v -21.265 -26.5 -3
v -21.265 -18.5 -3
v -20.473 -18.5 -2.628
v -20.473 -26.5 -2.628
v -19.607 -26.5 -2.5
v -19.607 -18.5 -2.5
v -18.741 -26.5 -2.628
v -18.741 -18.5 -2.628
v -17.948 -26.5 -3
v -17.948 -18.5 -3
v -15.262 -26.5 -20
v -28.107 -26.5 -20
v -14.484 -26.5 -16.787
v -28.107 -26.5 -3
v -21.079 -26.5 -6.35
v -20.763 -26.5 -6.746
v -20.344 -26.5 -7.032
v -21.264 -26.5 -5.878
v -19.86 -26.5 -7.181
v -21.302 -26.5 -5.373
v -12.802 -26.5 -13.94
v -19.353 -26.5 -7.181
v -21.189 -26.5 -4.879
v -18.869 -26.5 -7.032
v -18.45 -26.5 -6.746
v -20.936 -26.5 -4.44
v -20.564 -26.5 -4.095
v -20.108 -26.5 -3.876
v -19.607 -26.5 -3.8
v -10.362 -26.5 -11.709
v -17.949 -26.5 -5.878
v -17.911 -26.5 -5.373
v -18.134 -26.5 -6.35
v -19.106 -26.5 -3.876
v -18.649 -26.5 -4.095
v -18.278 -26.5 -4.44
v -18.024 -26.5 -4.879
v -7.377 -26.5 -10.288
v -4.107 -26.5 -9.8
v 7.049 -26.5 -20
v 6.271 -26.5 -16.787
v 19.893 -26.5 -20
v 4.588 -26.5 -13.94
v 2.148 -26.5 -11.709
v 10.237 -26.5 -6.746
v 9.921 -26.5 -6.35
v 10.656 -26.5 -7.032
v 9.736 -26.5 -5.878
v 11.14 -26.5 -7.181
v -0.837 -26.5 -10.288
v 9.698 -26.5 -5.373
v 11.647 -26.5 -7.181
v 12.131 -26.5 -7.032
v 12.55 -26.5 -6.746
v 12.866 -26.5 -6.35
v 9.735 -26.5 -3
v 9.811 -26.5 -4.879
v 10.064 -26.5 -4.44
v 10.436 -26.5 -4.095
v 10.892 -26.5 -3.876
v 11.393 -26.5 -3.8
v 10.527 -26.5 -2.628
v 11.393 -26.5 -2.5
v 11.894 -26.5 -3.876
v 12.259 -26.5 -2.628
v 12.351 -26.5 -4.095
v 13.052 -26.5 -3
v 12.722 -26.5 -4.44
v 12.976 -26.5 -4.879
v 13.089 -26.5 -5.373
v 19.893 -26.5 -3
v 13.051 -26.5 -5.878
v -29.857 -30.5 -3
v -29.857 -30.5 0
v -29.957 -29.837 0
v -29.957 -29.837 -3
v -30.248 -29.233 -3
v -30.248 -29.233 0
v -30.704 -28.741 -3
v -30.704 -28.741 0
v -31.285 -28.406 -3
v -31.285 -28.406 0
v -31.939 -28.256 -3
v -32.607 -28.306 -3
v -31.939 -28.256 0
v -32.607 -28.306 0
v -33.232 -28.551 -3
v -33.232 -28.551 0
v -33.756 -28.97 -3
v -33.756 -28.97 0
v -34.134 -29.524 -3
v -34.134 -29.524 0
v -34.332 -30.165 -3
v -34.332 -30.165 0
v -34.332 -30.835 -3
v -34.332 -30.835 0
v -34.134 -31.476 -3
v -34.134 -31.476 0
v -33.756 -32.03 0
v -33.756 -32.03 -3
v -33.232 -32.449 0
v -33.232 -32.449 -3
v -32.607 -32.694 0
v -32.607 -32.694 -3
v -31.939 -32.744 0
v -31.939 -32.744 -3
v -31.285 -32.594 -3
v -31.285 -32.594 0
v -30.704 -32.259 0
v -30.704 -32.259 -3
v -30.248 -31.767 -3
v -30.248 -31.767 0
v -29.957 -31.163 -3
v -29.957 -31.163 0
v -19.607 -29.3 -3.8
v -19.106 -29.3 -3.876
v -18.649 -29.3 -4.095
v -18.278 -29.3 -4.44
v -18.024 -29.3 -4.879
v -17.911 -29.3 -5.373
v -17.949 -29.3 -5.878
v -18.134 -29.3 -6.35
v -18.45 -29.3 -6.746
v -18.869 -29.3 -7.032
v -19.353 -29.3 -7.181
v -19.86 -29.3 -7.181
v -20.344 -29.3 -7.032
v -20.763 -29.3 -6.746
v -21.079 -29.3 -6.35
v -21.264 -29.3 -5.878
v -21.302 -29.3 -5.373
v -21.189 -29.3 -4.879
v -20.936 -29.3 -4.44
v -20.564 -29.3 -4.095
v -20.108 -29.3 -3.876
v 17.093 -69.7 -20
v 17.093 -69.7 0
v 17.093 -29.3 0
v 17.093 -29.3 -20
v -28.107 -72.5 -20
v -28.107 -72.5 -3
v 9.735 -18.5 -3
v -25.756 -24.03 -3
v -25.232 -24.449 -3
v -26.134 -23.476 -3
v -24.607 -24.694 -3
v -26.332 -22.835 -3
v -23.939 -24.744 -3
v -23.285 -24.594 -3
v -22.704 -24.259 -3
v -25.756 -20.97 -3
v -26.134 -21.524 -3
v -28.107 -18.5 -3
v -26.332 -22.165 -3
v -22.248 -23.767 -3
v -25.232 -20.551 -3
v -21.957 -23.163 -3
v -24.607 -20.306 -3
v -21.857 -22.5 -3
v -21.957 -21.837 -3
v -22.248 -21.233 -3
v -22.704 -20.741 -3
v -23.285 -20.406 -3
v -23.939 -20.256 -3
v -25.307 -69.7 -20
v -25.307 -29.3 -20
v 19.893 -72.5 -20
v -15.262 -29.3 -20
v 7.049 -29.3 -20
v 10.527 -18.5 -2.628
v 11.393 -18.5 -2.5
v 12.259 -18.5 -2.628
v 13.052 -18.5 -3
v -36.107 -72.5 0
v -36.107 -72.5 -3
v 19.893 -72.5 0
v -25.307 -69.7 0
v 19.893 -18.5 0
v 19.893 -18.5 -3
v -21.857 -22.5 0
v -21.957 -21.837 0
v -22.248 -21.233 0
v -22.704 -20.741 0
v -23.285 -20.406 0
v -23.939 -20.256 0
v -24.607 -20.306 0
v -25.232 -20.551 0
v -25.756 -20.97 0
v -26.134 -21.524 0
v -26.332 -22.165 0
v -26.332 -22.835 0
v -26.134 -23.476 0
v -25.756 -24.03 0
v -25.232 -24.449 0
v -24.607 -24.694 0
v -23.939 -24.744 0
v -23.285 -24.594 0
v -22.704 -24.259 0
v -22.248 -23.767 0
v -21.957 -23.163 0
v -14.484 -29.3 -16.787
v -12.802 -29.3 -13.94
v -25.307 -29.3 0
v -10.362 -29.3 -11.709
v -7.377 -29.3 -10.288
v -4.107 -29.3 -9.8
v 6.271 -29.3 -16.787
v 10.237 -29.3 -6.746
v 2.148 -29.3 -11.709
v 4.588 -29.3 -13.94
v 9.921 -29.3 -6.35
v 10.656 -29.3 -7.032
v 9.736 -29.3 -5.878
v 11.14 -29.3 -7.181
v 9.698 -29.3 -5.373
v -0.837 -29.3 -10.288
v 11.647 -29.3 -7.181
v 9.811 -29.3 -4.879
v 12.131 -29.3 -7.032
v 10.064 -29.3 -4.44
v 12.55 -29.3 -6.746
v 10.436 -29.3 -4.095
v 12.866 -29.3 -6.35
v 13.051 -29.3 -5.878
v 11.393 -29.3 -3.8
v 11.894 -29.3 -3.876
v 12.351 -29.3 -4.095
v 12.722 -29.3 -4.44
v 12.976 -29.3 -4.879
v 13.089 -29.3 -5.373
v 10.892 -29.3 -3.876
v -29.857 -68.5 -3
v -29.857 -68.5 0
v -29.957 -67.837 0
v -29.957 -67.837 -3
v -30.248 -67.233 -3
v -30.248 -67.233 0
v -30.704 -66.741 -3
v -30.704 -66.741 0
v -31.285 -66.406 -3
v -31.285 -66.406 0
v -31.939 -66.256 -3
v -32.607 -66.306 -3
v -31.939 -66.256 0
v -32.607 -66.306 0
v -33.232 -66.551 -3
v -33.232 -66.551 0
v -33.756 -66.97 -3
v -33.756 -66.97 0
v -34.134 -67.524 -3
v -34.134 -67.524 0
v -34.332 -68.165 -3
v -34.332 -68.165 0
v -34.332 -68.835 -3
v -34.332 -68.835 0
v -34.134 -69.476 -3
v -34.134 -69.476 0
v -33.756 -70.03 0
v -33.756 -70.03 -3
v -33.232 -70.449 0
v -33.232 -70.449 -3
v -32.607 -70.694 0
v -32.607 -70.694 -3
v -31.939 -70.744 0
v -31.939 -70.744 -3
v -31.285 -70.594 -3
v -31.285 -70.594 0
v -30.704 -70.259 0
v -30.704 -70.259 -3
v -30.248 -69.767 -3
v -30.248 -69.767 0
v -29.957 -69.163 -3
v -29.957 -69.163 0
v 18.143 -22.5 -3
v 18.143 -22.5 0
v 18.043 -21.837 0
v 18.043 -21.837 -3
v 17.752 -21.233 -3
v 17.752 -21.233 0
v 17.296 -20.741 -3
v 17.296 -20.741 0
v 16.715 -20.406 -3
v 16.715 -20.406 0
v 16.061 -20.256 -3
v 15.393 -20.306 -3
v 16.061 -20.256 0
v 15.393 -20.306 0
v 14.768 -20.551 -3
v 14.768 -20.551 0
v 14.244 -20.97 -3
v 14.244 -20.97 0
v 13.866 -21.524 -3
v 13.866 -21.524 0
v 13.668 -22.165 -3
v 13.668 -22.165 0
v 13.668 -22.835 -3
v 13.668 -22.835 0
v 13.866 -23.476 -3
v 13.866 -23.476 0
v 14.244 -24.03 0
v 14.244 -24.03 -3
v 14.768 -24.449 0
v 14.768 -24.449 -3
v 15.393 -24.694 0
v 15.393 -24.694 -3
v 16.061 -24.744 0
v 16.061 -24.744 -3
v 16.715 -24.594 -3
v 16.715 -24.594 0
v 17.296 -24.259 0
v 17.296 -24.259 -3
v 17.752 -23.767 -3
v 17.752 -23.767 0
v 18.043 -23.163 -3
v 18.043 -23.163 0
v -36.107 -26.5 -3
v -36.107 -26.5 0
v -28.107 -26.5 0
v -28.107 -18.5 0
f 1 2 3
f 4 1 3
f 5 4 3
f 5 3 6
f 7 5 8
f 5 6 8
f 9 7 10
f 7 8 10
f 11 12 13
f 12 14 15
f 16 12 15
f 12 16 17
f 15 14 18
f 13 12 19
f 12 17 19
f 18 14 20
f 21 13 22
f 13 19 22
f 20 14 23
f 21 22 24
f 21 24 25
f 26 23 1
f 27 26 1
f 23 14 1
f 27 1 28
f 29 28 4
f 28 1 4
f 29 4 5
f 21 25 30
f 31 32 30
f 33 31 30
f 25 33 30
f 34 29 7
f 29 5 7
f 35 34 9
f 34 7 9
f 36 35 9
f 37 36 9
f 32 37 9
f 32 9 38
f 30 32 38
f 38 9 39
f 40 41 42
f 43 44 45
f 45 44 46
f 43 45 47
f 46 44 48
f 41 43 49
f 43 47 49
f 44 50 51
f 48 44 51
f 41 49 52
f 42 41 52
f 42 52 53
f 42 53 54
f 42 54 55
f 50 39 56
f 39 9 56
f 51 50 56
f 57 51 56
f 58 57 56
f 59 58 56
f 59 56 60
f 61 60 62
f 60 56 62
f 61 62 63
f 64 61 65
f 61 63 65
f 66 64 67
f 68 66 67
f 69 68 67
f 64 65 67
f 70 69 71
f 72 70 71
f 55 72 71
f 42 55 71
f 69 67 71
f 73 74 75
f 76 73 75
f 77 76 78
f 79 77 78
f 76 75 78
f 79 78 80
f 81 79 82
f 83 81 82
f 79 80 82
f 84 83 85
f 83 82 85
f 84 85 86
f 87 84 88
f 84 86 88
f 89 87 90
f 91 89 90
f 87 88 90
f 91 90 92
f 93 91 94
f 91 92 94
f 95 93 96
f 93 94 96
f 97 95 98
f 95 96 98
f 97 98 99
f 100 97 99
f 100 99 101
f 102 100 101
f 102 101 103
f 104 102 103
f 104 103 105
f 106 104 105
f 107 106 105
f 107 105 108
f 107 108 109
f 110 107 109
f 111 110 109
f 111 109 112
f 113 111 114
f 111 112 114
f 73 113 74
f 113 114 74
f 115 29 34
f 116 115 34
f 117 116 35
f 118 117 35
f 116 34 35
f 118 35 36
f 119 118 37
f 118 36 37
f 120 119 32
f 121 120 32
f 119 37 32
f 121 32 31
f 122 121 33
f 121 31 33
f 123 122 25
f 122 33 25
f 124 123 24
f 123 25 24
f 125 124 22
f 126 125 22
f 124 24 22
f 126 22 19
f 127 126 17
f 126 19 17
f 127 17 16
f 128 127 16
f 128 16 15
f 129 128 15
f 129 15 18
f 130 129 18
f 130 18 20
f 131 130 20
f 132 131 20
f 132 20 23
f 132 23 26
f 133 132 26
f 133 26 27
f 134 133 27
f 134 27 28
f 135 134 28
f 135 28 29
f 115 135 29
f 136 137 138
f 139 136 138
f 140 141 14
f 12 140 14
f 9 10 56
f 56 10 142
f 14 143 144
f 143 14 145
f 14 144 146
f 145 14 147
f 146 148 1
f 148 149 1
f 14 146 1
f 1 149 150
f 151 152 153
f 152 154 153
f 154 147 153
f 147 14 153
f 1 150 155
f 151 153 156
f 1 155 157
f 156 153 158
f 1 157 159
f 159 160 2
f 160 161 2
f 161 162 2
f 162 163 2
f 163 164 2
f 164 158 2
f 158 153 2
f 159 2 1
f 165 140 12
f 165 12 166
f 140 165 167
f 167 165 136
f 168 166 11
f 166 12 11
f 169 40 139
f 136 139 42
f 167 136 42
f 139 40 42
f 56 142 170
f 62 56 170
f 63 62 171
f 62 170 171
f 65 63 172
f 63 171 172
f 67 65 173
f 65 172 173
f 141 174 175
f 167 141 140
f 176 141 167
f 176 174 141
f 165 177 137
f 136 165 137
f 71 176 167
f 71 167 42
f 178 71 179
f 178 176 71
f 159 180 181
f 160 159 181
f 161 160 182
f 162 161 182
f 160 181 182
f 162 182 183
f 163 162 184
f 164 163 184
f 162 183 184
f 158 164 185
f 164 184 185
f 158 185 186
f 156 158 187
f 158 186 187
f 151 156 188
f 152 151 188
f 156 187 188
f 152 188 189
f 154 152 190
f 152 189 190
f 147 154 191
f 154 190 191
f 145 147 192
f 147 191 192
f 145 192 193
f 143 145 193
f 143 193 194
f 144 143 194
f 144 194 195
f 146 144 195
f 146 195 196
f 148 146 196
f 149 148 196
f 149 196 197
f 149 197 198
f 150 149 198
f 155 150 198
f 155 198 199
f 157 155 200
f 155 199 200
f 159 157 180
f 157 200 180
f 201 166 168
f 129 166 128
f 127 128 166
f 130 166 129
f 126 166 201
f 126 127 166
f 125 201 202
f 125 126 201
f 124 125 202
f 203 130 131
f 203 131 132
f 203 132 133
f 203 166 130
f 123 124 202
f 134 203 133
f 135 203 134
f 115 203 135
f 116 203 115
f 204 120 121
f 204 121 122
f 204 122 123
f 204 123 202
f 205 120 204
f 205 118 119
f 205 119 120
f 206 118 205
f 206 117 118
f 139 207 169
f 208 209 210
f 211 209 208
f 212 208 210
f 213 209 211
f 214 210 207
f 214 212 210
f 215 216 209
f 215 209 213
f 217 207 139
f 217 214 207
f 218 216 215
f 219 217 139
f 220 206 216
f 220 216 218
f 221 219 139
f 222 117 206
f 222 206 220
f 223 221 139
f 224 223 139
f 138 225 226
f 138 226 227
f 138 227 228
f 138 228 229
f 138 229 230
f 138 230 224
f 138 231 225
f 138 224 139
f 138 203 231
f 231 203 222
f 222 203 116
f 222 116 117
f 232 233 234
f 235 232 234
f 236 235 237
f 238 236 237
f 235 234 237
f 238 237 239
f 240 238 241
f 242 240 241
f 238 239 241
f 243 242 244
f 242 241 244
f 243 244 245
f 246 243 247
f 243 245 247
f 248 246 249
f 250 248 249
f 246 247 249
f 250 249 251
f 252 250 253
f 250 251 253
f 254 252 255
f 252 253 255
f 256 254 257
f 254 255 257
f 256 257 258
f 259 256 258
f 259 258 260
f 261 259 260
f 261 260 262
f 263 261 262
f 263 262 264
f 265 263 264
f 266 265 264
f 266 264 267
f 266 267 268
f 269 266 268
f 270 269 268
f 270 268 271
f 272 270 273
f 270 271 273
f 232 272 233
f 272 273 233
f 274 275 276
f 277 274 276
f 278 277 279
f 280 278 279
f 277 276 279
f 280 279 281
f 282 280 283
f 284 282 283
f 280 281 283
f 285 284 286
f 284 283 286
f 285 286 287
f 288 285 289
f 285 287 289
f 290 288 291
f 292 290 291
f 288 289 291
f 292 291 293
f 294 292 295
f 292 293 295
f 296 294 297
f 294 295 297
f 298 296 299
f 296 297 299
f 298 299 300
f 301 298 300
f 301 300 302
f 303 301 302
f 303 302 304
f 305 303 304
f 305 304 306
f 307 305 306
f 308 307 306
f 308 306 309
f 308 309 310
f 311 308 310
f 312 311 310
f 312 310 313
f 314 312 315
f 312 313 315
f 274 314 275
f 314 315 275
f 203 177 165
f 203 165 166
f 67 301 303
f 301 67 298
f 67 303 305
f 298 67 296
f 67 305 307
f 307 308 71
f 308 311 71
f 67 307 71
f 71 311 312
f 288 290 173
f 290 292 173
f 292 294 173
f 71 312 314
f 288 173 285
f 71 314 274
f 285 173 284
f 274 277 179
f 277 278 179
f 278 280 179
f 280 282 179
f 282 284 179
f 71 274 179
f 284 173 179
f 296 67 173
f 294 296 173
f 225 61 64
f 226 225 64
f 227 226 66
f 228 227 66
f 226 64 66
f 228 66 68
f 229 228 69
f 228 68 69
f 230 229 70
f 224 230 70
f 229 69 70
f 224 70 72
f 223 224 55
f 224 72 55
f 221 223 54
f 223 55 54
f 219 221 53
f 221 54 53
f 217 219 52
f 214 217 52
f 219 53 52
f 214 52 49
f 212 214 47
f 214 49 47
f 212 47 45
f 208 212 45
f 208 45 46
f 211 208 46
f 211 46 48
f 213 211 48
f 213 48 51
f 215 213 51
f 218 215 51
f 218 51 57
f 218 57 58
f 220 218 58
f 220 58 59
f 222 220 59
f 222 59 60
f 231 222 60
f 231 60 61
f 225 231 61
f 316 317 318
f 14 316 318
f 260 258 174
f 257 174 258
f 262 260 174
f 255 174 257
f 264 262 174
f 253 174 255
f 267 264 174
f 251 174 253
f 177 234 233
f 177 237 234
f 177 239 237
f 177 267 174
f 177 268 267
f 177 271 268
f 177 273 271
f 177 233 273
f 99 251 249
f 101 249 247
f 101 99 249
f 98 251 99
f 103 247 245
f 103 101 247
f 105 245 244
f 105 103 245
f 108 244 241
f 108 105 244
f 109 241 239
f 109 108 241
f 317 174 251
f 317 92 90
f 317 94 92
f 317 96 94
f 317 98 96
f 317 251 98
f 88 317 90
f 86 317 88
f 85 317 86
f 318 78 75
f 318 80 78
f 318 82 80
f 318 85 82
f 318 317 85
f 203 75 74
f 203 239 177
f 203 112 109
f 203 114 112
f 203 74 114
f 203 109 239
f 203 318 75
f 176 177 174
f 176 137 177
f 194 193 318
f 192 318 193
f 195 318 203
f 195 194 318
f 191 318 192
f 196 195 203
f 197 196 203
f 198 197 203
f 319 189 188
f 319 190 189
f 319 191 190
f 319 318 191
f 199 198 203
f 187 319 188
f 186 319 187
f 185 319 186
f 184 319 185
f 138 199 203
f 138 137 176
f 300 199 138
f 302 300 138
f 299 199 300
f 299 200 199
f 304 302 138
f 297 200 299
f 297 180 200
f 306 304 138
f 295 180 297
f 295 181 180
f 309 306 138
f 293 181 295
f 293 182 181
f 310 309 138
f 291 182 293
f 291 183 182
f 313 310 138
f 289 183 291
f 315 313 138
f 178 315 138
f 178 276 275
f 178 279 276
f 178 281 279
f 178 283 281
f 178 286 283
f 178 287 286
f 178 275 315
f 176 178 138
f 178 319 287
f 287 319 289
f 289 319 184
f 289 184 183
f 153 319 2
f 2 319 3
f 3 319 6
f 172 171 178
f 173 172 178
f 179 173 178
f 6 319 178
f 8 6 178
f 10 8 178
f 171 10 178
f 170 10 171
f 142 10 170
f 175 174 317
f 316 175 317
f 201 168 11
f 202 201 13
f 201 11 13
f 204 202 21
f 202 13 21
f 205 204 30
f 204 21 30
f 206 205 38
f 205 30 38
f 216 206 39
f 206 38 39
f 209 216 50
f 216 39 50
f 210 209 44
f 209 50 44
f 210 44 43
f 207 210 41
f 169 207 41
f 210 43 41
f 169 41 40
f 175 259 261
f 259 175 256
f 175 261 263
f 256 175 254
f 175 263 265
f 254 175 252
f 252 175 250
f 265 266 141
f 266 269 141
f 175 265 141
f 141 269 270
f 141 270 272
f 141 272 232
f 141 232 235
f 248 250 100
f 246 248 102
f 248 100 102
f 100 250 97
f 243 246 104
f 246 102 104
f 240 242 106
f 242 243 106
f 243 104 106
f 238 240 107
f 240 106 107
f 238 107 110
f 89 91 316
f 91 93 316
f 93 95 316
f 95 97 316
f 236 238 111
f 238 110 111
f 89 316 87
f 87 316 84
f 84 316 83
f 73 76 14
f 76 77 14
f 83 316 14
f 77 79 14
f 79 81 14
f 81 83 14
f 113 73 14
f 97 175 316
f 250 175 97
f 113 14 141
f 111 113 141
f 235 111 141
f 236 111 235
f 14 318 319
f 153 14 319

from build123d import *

# Parameters (mm, degrees)
SKETCH1_W           = 48
SKETCH1_H           = 46
SKETCH1_W_2         = 42.4
SKETCH1_H_2         = 40.4
BOSS_EXTRUDE1_DEPTH = 20
CUT_EXTRUDE1_REACH  = 59.498
SKETCH3_R           = 11.2
CUT_EXTRUDE2_REACH  = 59.498
SKETCH5_R           = 1.7
SKETCH6_W           = 8
SKETCH6_H           = 46
SKETCH6_R           = 2.25
SKETCH6_W_2         = 48
SKETCH6_H_2         = 8
BOSS_EXTRUDE2_DEPTH = 3
SKETCH7_R           = 3
CUT_EXTRUDE3_DEPTH  = 8


with BuildPart() as part:
    # Sketch1 → Boss-Extrude1 (new body)
    with BuildSketch(Plane.XY):
        with Locations((-4.106729999, -49.5)):
            Rectangle(SKETCH1_W, SKETCH1_H)
        with Locations((-4.106729999, -49.5)):
            Rectangle(SKETCH1_W_2, SKETCH1_H_2, mode=Mode.SUBTRACT)
    extrude(amount=-BOSS_EXTRUDE1_DEPTH)

    # Sketch3 → Cut-Extrude1 (cut, up to next)
    with BuildSketch(Plane(origin=(0, -26.5, 0), x_dir=(1, 0, 0), z_dir=(0, 1, 0)), mode=Mode.PRIVATE) as cut_extrude1_sk1:
        with Locations((-4.106729999, 21)):
            Circle(SKETCH3_R)
    cut_extrude1_tool1 = extrude(cut_extrude1_sk1.sketch, amount=-CUT_EXTRUDE1_REACH, mode=Mode.PRIVATE) & part.part
    add(cut_extrude1_tool1.solids().sort_by_distance((-4.10673, -26.5, -21))[0], mode=Mode.SUBTRACT)

    # Sketch5 → Cut-Extrude2 (cut, up to next)
    with BuildSketch(Plane(origin=(0, -26.5, 0), x_dir=(1, 0, 0), z_dir=(0, 1, 0)), mode=Mode.PRIVATE) as cut_extrude2_sk1:
        with Locations(Location((11.393270001, 5.5, 0), (0, 0, 270))):
            Circle(SKETCH5_R)
    cut_extrude2_tool1 = extrude(cut_extrude2_sk1.sketch, amount=-CUT_EXTRUDE2_REACH, mode=Mode.PRIVATE) & part.part
    # Sketch5 → Cut-Extrude2 (cut, up to next)
    with BuildSketch(Plane(origin=(0, -26.5, 0), x_dir=(1, 0, 0), z_dir=(0, 1, 0)), mode=Mode.PRIVATE) as cut_extrude2_sk2:
        with Locations(Location((-19.606729999, 5.5, 0), (0, 0, 270))):
            Circle(SKETCH5_R)
    cut_extrude2_tool2 = extrude(cut_extrude2_sk2.sketch, amount=-CUT_EXTRUDE2_REACH, mode=Mode.PRIVATE) & part.part
    add(cut_extrude2_tool1.solids().sort_by_distance((11.39327, -26.5, -5.5))[0], mode=Mode.SUBTRACT)
    add(cut_extrude2_tool2.solids().sort_by_distance((-19.60673, -26.5, -5.5))[0], mode=Mode.SUBTRACT)

    # Sketch6 → Boss-Extrude2 (add)
    # profile 1 of 2: a face of its own
    with BuildSketch(Plane.XY):
        with Locations((-32.106729999, -49.5)):
            Rectangle(SKETCH6_W, SKETCH6_H)
        with Locations((-32.106729999, -68.5)):
            Circle(SKETCH6_R, mode=Mode.SUBTRACT)
        with Locations((-32.106729999, -30.5)):
            Circle(SKETCH6_R, mode=Mode.SUBTRACT)
    # profile 2 of 2: a face of its own
    with BuildSketch(Plane.XY):
        with Locations((-4.106729999, -22.5)):
            Rectangle(SKETCH6_W_2, SKETCH6_H_2)
        with Locations((-24.106729999, -22.5)):
            Circle(SKETCH6_R, mode=Mode.SUBTRACT)
        with Locations((15.893270001, -22.5)):
            Circle(SKETCH6_R, mode=Mode.SUBTRACT)
    extrude(amount=-BOSS_EXTRUDE2_DEPTH)

    # Sketch7 → Cut-Extrude3 (cut)
    with BuildSketch(Plane(origin=(0, -18.5, 0), x_dir=(1, 0, 0), z_dir=(0, 1, 0))):
        with Locations((11.393270001, 5.5)):
            Circle(SKETCH7_R)
        with Locations((-19.606729999, 5.5)):
            Circle(SKETCH7_R)
    extrude(amount=-CUT_EXTRUDE3_DEPTH, mode=Mode.SUBTRACT)


solid = part.part
